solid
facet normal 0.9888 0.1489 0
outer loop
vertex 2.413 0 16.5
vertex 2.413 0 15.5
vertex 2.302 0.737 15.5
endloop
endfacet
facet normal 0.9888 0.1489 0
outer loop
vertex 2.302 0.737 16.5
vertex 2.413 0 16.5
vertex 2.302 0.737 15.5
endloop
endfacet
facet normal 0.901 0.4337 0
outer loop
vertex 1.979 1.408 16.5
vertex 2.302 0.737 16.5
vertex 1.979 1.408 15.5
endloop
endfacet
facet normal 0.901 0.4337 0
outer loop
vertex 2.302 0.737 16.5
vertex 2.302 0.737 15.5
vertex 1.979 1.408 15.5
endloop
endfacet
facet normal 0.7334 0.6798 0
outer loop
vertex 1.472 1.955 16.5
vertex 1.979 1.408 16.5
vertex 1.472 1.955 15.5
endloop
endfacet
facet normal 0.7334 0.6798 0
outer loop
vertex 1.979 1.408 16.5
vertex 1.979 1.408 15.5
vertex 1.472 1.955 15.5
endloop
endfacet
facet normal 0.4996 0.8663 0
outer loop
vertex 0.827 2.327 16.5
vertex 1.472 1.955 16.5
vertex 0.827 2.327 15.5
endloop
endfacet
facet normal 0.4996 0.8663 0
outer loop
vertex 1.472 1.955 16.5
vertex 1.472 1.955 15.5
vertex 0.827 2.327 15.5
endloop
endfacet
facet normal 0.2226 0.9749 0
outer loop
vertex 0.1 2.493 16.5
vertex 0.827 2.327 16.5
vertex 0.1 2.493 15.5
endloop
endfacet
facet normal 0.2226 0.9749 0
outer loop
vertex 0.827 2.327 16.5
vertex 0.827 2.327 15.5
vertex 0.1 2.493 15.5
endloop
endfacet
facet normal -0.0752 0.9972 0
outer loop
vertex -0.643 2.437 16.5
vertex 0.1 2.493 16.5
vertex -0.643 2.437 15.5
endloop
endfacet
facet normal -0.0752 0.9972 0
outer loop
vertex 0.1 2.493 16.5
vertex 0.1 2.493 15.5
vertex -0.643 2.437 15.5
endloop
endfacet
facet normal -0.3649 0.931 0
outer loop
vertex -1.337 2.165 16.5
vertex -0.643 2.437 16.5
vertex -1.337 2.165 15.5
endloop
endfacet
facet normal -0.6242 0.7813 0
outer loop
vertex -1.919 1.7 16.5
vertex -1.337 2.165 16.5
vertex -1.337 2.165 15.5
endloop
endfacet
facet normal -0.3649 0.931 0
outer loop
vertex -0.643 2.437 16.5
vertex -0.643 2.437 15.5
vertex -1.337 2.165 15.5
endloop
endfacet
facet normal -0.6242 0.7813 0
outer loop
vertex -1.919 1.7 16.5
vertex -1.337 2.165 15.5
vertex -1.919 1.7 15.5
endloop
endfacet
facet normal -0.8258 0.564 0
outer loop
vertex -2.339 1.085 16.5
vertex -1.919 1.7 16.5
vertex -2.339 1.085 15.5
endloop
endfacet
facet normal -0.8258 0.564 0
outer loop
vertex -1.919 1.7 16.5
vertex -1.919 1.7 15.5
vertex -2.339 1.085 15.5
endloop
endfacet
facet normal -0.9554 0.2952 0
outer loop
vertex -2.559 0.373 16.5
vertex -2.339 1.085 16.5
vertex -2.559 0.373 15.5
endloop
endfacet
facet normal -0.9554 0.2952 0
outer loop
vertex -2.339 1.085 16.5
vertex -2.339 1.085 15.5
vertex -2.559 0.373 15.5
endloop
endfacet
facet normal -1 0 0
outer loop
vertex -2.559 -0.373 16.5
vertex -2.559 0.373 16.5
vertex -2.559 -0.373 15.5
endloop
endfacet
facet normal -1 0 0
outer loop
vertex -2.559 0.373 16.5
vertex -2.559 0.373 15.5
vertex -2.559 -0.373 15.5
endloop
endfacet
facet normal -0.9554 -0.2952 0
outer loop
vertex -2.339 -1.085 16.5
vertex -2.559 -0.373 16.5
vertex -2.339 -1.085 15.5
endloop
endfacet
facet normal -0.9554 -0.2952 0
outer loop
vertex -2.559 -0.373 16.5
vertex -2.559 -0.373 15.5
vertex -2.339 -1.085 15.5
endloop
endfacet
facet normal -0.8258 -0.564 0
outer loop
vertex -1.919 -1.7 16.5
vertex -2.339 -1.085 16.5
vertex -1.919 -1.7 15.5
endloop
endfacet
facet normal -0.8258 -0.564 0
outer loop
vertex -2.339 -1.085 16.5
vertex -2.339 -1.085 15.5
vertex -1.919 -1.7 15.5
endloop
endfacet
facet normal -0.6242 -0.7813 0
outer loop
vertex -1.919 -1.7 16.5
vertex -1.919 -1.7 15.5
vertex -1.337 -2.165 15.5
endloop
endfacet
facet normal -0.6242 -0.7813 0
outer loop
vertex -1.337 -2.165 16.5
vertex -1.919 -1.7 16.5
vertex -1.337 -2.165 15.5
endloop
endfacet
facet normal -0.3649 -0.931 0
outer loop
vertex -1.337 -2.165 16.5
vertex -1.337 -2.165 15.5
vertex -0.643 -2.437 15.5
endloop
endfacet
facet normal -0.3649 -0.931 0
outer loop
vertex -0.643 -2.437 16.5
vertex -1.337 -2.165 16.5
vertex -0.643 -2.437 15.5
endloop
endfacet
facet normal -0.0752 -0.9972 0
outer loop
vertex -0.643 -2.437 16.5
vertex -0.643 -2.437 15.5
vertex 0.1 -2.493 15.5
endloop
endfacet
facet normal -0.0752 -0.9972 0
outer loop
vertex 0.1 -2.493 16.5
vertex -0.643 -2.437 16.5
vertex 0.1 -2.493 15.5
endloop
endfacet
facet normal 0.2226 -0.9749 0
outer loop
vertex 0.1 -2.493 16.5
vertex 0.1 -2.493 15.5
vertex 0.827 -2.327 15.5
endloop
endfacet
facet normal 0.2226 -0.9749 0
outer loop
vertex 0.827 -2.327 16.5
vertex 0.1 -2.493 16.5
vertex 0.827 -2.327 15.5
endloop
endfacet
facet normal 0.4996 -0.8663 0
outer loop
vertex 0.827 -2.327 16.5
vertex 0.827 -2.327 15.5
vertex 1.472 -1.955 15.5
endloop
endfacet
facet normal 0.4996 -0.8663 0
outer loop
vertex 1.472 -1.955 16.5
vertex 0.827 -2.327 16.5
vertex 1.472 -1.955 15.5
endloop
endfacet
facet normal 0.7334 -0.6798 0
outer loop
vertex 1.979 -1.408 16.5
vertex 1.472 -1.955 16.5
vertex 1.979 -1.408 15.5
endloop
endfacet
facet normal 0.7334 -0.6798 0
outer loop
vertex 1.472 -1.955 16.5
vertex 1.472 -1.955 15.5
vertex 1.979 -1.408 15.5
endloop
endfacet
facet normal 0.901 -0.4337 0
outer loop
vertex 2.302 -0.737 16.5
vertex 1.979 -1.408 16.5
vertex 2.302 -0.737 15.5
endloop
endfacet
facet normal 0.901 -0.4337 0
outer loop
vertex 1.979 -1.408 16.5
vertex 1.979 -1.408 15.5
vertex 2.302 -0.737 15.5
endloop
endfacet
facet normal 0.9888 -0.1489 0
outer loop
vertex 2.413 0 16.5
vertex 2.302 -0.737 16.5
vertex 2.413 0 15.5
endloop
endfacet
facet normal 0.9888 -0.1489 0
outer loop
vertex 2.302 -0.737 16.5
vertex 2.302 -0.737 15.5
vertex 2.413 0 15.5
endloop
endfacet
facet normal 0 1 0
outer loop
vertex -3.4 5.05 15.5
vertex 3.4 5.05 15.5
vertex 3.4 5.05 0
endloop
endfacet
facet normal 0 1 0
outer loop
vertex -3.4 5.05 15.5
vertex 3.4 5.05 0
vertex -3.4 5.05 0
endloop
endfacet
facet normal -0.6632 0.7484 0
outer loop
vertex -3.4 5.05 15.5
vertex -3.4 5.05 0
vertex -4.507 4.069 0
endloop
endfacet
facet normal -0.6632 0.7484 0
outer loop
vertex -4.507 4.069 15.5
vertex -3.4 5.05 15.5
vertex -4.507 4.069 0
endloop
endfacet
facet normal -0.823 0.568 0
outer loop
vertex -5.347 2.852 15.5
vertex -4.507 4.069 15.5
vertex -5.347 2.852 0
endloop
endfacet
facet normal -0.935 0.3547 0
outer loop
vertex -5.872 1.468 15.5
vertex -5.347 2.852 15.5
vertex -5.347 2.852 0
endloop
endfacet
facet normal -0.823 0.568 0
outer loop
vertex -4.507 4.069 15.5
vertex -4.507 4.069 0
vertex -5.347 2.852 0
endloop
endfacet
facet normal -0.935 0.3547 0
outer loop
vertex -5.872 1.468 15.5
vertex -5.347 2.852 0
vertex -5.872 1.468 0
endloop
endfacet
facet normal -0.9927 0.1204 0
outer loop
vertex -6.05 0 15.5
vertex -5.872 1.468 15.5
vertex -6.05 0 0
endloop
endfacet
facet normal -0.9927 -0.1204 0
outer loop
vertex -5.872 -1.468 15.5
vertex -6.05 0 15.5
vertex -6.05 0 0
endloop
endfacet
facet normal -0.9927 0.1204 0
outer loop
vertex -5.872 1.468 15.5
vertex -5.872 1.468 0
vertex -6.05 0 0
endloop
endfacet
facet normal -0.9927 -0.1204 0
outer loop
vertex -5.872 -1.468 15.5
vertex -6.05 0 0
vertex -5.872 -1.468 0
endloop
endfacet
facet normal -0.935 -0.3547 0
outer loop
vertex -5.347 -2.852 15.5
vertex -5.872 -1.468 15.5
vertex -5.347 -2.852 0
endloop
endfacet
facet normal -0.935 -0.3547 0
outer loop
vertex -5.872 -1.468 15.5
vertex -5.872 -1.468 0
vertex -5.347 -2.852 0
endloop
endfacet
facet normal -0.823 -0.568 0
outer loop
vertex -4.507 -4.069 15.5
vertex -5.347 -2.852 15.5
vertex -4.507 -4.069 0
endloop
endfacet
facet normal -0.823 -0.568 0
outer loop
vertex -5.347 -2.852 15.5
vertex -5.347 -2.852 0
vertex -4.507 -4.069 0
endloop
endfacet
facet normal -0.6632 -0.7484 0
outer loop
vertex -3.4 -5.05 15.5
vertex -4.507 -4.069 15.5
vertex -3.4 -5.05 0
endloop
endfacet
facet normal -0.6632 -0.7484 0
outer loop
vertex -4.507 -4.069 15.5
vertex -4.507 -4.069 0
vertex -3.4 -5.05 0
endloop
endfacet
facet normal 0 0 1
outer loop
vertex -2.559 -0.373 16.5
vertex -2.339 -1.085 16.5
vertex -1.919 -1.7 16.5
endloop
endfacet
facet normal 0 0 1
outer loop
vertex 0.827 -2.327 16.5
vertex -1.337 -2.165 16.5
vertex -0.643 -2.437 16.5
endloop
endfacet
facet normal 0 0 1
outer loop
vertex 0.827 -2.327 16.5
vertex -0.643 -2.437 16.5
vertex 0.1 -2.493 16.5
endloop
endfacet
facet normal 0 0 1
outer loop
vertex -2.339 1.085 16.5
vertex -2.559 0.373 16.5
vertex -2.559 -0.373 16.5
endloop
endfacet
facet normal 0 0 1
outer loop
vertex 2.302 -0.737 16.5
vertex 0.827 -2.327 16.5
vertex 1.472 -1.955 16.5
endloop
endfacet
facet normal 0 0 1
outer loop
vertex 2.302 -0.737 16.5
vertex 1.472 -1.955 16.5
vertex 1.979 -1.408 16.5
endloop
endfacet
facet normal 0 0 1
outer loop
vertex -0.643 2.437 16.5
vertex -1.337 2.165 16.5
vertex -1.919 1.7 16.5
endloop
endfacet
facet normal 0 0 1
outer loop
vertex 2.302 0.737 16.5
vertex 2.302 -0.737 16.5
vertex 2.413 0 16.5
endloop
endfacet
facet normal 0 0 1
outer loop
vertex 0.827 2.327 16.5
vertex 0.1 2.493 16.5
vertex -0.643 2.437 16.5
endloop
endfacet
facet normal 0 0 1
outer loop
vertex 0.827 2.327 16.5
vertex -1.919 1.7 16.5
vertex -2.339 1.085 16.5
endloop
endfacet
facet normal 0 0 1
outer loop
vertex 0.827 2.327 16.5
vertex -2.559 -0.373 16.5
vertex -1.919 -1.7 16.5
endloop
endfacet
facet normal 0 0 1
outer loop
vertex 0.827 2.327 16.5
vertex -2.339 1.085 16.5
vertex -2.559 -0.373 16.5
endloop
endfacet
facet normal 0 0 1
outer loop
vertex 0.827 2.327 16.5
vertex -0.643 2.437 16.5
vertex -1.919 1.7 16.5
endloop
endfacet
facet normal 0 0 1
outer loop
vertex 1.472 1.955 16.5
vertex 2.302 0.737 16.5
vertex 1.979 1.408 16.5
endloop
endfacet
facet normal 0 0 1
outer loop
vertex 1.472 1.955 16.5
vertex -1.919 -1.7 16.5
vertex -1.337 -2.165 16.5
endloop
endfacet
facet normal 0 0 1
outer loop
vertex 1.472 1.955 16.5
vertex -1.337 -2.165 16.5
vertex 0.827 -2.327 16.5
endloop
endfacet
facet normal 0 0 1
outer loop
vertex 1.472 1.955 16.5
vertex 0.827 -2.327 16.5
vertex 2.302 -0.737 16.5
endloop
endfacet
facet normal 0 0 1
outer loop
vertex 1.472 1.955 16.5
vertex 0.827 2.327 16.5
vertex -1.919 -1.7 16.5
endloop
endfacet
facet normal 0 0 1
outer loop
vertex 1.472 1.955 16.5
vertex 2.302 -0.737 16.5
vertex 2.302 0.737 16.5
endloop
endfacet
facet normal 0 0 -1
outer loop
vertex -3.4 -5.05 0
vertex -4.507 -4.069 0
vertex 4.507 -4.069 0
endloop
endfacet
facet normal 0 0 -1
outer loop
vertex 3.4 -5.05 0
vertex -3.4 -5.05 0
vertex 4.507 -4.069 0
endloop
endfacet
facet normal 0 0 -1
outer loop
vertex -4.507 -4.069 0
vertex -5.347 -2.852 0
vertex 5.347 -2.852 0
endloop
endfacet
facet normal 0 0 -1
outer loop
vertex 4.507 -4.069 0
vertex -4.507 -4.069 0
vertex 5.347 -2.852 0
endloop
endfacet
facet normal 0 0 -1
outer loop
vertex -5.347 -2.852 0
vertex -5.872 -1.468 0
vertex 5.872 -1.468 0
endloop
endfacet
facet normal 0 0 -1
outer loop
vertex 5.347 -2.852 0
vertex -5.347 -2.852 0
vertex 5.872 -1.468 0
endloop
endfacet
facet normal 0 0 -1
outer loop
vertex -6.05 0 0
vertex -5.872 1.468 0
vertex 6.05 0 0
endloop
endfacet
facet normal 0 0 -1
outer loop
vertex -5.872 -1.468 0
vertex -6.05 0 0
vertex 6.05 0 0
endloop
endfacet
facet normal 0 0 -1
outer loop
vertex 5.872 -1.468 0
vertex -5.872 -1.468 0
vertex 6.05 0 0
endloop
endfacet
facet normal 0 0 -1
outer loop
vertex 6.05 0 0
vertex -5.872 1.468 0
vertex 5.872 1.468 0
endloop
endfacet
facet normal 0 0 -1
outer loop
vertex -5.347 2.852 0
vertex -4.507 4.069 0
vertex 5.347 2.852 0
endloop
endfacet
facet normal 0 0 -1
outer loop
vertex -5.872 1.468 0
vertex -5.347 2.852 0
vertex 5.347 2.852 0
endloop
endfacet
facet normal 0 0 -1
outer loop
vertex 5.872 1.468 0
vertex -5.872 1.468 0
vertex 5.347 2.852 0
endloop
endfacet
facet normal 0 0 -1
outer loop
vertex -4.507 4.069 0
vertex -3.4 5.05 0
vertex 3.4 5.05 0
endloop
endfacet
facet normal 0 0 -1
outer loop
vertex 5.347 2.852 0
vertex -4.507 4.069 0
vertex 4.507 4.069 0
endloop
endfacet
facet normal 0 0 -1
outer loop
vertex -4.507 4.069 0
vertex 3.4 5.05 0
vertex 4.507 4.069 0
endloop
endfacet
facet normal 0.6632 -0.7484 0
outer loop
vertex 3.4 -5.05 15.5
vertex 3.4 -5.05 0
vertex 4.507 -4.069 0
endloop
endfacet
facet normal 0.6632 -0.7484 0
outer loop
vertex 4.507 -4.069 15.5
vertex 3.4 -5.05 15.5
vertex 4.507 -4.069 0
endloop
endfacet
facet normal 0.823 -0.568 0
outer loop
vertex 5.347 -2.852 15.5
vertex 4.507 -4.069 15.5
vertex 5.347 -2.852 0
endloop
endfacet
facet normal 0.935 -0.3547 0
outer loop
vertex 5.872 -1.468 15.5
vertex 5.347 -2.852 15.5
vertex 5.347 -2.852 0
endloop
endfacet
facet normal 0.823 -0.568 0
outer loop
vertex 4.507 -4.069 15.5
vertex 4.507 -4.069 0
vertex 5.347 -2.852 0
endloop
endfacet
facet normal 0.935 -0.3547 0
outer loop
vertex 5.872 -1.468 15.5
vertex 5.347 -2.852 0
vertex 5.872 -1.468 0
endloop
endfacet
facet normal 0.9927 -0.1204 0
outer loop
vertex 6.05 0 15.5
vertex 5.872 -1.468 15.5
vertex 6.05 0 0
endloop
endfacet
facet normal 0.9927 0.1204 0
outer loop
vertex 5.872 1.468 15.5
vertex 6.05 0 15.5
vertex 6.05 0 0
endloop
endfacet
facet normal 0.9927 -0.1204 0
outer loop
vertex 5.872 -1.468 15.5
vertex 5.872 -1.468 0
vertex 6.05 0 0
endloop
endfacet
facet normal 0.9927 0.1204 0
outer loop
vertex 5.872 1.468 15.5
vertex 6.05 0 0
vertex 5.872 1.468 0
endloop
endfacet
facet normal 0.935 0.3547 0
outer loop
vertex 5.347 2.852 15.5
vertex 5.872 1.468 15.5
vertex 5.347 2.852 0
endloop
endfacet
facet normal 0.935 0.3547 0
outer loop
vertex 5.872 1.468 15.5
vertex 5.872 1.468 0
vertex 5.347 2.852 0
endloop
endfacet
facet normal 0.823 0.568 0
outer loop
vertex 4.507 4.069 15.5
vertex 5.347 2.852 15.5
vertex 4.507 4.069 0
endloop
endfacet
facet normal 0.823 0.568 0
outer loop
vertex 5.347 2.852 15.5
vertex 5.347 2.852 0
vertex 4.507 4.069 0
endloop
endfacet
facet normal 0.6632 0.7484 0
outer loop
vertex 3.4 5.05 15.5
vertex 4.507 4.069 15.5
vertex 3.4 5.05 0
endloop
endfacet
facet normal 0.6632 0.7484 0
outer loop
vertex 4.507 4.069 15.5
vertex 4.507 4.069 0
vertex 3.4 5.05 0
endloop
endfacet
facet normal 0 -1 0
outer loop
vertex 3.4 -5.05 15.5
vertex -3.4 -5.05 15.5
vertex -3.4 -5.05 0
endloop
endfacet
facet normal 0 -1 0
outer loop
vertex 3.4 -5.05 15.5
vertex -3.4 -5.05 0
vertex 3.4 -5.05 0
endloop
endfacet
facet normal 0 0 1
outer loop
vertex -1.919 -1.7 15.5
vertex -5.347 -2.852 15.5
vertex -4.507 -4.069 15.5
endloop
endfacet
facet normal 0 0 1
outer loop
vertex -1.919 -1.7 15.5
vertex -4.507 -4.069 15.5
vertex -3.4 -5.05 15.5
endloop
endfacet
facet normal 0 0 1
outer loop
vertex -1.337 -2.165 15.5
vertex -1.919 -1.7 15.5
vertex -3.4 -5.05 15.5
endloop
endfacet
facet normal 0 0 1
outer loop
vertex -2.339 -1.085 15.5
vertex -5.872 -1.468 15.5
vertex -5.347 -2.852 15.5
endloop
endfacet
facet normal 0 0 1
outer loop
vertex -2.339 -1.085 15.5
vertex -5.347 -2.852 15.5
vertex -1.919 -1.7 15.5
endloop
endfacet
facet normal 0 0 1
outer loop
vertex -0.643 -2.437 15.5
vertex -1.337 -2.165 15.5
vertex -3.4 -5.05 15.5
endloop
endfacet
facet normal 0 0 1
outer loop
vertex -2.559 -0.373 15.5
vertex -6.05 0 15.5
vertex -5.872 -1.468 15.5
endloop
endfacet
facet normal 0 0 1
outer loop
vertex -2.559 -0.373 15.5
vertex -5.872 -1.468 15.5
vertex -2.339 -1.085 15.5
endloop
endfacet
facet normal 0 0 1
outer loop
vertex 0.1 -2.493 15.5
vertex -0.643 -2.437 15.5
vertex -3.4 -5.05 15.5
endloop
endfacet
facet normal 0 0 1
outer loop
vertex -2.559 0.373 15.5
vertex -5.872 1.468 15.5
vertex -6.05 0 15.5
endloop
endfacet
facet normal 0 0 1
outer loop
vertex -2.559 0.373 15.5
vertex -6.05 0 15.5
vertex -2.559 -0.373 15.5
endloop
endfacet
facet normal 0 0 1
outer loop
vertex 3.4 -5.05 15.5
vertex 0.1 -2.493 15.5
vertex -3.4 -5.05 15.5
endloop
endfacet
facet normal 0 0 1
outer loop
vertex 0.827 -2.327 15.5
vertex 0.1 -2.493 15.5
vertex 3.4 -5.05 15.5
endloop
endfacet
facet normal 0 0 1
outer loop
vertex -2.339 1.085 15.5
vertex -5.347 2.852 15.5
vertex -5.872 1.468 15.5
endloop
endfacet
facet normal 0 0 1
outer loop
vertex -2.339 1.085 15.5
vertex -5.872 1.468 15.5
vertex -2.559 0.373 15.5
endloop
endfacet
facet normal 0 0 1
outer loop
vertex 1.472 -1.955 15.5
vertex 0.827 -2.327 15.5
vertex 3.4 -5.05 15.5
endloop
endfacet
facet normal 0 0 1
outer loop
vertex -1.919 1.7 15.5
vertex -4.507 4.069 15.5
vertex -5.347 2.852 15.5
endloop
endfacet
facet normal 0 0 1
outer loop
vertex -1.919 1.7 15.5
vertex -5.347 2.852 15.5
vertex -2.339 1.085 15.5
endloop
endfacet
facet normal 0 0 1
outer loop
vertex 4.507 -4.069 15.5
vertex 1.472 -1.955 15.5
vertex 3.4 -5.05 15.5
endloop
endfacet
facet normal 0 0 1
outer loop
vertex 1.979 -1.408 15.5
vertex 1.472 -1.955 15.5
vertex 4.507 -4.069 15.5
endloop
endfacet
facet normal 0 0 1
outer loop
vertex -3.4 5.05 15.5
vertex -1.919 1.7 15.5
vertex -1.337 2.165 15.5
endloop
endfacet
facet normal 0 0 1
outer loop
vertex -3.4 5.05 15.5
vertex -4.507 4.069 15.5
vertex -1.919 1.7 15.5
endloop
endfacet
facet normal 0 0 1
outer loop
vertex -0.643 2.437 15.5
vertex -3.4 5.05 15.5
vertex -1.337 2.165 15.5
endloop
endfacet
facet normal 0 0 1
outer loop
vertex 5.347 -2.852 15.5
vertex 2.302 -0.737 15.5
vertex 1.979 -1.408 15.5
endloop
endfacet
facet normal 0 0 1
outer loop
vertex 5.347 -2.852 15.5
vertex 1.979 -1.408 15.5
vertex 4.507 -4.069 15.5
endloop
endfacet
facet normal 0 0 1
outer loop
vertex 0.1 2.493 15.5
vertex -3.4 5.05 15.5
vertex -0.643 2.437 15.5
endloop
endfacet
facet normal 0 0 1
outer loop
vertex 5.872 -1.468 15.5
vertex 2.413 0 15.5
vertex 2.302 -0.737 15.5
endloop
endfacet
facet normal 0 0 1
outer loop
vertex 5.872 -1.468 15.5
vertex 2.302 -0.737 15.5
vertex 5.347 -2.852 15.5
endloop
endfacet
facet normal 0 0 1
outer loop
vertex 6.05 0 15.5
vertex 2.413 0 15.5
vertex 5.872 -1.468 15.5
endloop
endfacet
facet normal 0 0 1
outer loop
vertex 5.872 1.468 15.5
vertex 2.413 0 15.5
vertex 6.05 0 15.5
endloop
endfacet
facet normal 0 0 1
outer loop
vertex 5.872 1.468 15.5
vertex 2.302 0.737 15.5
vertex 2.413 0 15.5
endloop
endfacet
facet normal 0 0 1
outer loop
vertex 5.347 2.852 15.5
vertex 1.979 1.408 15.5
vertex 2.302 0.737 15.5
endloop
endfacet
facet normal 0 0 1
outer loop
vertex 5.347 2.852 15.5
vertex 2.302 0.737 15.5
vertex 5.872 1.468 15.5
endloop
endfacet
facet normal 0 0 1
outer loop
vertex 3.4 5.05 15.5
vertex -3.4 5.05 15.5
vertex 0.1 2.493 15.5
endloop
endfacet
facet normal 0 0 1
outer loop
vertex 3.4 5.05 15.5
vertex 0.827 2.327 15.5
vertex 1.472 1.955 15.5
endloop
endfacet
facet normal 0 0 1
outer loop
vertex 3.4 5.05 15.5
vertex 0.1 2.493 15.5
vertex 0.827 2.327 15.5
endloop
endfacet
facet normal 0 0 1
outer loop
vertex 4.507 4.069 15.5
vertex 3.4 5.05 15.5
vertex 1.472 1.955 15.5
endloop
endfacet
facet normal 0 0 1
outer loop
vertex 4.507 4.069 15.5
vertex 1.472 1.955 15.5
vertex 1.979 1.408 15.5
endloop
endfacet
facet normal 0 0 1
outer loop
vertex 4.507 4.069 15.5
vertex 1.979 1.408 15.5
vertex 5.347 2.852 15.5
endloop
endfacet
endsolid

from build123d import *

# Parameters (mm, degrees)
F1_DEPTH = 15.5
F2_R     = 2.5
F3_DEPTH = 1


with BuildPart() as f1:
    # F0 (on Top) → F1 (new body)
    with BuildSketch(Plane.XY):
        with BuildLine():
            ThreePointArc((3.4, -5.05), (6.05, 0), (3.4, 5.05))
            Line((3.4, 5.05), (-3.4, 5.05))
            ThreePointArc((-3.4, 5.05), (-6.05, 0), (-3.4, -5.05))
            Line((-3.4, -5.05), (3.4, -5.05))
        make_face()
    extrude(amount=F1_DEPTH)

    # F2 (on face) → F3 (join)
    with BuildSketch(Plane.XY.offset(15.5)):
        with Locations((-0.086792, 0)):
            Circle(F2_R)
    extrude(amount=F3_DEPTH)


solid = f1.part
